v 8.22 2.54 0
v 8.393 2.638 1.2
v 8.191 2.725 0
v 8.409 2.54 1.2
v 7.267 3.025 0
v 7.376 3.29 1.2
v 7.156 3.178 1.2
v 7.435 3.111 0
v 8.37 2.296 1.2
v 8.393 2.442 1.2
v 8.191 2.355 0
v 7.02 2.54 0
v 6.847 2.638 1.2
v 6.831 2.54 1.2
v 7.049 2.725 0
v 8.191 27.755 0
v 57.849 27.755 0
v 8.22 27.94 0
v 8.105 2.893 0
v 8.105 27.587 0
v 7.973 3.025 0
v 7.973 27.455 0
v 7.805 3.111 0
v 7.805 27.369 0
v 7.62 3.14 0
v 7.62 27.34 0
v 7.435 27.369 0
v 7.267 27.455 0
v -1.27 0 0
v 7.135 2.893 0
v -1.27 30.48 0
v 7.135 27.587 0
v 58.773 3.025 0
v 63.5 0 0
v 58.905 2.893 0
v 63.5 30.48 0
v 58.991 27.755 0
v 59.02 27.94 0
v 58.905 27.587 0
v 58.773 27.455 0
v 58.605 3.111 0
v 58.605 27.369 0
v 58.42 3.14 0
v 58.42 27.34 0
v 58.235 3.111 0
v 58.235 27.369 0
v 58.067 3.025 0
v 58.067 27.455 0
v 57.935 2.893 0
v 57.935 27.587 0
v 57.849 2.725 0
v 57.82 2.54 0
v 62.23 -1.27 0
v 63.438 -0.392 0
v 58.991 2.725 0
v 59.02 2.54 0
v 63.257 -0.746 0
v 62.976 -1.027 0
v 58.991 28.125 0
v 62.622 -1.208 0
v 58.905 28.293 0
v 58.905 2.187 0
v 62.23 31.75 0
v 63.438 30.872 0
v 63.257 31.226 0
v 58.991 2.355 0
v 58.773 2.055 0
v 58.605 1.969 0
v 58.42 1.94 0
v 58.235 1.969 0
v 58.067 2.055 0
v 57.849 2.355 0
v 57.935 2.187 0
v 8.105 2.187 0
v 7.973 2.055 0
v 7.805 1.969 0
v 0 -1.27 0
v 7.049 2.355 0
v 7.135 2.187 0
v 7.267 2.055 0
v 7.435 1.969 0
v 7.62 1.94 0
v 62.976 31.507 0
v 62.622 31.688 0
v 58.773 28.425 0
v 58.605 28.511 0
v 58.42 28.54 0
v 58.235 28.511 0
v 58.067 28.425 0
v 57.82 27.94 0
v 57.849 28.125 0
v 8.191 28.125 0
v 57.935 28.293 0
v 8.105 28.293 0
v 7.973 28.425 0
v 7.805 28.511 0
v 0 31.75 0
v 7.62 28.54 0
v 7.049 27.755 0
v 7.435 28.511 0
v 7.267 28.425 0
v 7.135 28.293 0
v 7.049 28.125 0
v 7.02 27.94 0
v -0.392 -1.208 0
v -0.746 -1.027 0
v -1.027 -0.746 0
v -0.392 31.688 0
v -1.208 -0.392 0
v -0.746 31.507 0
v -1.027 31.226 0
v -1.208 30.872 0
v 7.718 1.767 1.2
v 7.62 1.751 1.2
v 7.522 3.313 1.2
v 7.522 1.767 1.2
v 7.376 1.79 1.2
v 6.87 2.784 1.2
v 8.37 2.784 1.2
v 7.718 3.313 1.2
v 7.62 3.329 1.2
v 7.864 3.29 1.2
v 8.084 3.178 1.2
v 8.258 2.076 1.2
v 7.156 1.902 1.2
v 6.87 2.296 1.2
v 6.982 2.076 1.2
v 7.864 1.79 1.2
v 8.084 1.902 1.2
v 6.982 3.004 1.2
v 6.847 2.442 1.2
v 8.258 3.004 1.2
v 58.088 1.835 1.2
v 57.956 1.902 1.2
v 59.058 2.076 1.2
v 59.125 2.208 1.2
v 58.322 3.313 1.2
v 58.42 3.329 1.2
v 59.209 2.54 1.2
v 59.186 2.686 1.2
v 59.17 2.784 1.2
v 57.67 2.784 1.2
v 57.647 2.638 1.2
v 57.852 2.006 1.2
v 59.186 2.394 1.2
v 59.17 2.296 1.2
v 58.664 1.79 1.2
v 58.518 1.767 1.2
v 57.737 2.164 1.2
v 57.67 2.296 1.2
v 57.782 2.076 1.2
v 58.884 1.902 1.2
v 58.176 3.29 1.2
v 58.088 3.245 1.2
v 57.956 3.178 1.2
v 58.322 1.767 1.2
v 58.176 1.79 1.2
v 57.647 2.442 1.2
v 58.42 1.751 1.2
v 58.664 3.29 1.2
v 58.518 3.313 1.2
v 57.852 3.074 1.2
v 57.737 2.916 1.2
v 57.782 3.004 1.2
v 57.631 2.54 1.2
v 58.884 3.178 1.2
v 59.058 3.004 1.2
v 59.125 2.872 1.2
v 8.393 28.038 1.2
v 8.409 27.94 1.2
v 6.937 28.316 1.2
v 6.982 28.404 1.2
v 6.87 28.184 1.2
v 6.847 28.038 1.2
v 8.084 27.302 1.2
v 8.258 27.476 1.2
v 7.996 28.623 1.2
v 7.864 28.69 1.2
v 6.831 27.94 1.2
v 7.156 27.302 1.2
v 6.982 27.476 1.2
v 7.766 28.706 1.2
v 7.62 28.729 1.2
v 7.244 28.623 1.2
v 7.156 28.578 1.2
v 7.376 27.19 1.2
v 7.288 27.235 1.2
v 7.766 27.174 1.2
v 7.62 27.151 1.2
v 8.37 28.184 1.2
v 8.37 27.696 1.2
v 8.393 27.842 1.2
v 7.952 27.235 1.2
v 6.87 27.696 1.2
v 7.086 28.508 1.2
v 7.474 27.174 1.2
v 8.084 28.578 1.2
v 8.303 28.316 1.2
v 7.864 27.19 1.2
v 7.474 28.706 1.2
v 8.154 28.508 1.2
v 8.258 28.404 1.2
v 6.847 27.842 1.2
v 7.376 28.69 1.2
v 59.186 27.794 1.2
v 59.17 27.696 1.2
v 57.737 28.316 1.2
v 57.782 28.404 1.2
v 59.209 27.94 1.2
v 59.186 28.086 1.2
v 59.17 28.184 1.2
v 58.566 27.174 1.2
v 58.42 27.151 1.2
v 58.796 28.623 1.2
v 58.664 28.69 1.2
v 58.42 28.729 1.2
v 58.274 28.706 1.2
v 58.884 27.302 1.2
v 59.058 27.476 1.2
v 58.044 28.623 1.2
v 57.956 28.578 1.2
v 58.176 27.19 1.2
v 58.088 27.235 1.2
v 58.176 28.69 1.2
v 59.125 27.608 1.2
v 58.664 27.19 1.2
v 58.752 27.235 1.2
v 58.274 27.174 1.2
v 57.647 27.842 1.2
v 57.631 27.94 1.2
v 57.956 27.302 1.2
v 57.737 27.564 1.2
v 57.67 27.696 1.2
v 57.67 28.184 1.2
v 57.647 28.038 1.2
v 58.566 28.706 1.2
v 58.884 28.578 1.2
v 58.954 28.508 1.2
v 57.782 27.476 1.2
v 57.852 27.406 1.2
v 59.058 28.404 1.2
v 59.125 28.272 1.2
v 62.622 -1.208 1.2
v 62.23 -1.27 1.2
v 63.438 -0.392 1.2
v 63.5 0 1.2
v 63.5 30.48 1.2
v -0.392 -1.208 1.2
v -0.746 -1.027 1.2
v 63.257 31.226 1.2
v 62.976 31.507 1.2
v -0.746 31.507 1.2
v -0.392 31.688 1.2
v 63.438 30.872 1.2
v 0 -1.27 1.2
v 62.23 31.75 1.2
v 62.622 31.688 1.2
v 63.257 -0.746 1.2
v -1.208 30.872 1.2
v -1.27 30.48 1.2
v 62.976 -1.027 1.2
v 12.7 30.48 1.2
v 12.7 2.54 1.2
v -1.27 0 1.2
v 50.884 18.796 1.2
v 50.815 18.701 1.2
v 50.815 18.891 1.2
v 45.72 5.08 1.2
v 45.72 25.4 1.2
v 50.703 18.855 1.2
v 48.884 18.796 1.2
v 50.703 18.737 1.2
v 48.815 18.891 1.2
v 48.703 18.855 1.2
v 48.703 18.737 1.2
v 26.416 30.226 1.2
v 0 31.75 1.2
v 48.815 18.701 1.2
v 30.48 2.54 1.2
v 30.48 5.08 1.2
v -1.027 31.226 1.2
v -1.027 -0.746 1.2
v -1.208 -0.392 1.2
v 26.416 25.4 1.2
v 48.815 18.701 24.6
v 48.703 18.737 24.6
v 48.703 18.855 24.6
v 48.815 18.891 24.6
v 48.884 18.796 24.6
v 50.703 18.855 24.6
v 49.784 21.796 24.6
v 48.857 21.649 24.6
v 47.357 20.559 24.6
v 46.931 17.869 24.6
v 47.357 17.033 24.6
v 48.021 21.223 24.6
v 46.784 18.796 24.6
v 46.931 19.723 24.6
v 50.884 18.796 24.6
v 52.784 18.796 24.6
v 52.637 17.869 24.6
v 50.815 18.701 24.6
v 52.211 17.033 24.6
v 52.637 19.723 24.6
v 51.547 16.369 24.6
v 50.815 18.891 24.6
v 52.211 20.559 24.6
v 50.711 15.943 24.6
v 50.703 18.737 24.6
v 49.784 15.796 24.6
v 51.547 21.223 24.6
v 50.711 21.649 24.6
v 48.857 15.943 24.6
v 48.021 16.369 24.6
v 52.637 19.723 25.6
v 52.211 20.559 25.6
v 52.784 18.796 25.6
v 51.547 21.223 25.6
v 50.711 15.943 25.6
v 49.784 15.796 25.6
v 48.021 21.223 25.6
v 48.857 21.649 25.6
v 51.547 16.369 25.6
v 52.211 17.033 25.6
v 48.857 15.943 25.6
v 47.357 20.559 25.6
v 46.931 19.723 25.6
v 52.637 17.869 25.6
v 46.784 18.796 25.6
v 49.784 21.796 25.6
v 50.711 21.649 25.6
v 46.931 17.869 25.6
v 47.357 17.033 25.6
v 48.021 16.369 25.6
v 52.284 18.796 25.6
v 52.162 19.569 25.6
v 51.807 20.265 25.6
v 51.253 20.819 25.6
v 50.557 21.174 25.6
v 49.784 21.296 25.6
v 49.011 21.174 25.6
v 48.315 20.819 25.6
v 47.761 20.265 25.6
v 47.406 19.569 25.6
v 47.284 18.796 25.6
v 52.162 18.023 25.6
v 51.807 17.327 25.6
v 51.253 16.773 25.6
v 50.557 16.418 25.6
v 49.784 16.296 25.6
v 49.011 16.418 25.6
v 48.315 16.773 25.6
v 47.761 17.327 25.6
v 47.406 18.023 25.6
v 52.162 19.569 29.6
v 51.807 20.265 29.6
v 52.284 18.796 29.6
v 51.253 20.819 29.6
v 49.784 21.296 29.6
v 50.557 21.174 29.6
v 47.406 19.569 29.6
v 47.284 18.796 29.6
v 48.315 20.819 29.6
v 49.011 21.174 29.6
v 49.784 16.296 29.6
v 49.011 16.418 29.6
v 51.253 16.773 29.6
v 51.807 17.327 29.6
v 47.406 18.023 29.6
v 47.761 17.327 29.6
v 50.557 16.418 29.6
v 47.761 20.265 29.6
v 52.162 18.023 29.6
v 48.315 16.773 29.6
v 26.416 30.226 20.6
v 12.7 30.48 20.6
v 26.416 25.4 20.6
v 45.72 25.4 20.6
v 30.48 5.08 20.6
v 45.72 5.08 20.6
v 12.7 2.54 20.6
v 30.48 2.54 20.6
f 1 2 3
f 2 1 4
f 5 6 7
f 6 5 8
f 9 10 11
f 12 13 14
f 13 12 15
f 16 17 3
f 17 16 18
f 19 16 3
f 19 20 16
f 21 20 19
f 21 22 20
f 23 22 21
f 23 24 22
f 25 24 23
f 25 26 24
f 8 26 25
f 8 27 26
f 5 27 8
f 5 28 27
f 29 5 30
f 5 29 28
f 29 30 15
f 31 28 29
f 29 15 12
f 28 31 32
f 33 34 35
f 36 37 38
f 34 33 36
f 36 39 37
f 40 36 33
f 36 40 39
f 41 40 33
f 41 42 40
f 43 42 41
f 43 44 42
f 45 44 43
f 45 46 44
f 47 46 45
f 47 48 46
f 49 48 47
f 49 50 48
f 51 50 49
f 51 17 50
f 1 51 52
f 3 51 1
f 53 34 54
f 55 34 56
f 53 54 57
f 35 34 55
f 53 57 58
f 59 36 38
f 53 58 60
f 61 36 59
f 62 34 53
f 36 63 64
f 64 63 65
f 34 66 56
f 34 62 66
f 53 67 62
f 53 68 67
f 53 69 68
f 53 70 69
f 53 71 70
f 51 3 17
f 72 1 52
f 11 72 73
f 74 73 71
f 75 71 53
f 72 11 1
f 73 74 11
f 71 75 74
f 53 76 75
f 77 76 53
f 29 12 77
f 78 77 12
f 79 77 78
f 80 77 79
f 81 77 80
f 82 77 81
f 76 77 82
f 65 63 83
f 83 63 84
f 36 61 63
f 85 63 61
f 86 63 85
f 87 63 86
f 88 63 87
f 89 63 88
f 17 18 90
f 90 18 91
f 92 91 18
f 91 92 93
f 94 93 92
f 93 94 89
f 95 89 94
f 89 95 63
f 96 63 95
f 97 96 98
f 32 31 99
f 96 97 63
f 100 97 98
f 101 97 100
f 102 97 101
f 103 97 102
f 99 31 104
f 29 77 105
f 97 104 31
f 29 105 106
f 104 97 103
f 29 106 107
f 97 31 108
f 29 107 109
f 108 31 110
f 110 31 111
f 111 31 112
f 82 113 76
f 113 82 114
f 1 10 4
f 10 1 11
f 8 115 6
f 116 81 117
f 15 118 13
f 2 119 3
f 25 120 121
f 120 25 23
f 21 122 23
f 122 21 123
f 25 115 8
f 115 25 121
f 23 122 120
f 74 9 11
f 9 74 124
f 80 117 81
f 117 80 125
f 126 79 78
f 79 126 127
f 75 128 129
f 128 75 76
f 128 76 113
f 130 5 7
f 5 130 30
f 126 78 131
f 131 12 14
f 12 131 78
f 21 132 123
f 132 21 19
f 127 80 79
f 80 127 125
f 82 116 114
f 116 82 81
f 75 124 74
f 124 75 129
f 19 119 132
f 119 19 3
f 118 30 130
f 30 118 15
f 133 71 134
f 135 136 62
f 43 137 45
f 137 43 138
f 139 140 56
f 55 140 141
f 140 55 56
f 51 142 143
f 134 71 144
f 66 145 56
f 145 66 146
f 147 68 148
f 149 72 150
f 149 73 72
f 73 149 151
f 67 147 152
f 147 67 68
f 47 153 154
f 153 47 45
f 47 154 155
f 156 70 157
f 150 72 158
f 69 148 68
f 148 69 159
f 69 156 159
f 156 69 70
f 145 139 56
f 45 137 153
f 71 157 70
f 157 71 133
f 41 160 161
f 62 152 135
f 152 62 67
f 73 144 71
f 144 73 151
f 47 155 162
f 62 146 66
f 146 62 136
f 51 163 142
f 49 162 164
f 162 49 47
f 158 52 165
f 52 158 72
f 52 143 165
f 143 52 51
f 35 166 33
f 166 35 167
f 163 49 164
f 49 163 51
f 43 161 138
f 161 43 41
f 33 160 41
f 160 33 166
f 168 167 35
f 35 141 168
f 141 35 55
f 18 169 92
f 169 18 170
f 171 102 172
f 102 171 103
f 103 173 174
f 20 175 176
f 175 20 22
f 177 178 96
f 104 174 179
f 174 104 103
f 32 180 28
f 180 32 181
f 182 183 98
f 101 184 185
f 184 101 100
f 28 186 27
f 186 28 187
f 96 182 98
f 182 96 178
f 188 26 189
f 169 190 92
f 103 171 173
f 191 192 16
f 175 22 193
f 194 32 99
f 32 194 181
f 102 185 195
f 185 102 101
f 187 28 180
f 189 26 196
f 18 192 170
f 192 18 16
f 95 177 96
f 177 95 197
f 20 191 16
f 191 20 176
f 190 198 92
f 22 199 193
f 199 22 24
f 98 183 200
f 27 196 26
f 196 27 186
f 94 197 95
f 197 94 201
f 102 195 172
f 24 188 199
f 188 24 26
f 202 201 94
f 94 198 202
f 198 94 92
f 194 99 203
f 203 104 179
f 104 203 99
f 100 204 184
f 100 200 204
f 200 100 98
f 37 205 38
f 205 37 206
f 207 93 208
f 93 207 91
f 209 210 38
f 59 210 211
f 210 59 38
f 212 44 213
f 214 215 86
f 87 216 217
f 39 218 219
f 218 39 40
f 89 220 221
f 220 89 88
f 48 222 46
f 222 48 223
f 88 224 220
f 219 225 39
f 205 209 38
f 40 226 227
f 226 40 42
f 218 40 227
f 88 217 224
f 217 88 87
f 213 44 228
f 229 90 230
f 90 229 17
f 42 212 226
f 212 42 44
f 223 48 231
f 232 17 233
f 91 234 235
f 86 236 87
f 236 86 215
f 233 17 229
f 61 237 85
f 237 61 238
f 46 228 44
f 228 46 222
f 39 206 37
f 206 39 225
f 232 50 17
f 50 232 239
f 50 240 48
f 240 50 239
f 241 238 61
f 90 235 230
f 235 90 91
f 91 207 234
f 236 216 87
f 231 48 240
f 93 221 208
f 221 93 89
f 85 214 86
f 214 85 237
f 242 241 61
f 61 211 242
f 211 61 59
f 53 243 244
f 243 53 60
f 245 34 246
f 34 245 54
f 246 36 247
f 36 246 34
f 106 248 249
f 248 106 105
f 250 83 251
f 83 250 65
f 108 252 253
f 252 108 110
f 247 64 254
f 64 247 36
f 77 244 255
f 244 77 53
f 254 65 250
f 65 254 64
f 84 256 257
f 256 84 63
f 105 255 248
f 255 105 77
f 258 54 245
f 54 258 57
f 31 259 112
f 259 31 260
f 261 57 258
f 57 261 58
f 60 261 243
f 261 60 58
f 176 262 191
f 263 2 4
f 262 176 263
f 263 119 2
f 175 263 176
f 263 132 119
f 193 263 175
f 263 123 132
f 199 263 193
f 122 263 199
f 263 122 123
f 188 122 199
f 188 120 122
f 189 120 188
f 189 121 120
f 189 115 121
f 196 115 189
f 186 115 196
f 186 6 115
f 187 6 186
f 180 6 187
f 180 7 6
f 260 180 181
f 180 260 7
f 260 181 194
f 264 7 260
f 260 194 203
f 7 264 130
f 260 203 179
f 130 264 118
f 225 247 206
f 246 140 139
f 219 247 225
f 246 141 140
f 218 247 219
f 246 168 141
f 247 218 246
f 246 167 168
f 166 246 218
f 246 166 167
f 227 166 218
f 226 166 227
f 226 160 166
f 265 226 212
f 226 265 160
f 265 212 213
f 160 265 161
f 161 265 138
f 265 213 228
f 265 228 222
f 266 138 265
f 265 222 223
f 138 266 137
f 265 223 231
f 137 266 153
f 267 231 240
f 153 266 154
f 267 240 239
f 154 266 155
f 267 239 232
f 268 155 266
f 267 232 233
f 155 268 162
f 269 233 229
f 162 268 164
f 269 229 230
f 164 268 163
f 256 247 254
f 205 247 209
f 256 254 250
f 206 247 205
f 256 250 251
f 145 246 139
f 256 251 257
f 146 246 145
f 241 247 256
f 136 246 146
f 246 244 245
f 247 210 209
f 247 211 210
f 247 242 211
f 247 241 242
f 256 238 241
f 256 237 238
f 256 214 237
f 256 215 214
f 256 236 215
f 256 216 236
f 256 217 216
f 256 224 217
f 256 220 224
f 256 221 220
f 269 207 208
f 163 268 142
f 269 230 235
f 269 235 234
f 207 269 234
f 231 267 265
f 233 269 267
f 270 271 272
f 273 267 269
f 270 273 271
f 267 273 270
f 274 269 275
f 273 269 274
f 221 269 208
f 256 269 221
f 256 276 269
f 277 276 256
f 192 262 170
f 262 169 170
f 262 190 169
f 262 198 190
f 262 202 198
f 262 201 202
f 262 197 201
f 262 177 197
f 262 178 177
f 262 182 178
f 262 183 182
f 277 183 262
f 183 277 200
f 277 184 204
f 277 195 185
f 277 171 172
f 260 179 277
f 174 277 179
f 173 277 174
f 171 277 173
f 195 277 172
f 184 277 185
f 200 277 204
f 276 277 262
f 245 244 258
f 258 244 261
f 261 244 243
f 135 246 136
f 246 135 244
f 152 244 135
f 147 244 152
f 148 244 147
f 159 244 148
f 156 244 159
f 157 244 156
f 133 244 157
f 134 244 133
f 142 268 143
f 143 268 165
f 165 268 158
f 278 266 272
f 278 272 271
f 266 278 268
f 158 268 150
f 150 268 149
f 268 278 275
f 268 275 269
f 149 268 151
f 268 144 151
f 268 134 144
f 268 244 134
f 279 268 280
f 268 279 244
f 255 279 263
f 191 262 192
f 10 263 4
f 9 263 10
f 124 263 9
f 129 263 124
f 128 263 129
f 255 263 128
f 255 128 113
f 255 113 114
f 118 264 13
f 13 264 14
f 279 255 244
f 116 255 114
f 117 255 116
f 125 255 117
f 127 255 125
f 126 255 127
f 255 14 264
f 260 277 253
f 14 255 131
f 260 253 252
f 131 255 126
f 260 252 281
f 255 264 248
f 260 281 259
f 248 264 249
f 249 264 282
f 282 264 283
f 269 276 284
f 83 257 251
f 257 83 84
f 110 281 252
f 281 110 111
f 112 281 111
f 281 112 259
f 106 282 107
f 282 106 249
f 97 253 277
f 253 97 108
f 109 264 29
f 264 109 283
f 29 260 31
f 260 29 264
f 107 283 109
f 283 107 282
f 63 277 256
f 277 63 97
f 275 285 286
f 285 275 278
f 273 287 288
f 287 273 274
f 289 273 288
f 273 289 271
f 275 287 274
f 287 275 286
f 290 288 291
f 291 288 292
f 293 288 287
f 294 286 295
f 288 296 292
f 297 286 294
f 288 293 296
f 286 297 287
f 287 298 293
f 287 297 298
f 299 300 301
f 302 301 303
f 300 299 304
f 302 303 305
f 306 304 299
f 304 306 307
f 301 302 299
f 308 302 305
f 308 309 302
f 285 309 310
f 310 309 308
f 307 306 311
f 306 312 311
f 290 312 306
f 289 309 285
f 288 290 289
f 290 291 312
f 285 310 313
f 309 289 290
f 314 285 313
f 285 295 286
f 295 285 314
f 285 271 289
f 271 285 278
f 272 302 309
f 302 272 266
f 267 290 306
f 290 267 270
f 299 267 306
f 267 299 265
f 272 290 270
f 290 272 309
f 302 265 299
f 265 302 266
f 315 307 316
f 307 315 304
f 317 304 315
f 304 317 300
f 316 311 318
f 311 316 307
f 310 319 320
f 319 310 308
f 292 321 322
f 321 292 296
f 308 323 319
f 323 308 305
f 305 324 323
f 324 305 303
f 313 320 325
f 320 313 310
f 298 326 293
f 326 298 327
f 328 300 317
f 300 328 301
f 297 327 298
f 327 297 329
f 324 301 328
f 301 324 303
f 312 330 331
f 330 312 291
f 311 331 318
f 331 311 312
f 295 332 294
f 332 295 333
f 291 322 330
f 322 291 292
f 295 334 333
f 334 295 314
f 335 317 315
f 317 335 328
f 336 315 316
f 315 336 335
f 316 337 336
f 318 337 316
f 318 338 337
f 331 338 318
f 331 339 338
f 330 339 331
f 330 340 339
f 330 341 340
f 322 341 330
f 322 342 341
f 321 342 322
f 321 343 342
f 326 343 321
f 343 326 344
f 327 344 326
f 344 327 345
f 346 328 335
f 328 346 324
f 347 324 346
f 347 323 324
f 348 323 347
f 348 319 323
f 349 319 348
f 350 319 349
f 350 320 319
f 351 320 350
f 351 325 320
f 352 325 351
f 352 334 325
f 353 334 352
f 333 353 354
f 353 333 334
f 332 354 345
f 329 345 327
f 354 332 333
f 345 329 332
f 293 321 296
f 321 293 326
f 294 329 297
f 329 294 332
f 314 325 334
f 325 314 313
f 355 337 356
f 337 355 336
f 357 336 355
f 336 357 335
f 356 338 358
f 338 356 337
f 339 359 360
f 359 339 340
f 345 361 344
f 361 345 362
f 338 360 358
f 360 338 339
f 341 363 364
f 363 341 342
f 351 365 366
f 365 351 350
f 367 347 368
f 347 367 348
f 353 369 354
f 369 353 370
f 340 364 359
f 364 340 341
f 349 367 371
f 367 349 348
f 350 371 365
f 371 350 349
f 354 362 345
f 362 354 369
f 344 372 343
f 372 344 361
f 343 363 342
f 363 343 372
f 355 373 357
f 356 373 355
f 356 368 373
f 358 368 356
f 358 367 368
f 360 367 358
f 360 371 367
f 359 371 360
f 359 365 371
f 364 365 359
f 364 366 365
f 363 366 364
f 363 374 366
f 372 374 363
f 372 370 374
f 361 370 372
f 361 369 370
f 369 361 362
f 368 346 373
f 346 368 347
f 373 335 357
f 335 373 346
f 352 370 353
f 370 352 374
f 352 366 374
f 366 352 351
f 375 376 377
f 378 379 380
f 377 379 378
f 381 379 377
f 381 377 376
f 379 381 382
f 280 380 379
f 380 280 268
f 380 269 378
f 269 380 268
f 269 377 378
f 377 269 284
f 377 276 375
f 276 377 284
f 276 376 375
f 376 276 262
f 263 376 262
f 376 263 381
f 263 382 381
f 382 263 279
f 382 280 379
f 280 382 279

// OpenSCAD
h = 0.6;
i = 25.4;

fn = 20;

w = 2.45 * i;
d = 1.2 * i;


difference()
{
    minkowski()
    {
        cube([w, d, h]);
        cylinder(d = 0.1 * i, h, $fn = fn);
    }
    
    translate([0.3 * i, 0.1 * i, 0])
        quads(2 * i, 1 * i)
            cylinder(0.1 * i, h, $fn = fn);
}

translate ([1.96 * i,0.74 * i,h + 24])
{
    translate([-1,0,-24]) cylinder(d = 0.2, 24);
    translate([1,0,-24]) cylinder(d = 0.2, 24);
    cylinder(d = 6, 1, $fn = fn);
    cylinder(d = 5, 5, $fn = fn);
}

translate([0.5 *i,0.1 * i,h])
{
    scale([i,i,1])
    linear_extrude(20)
    {
        polygon([[0,0], [0,1.1], [0.54,1.09], [0.54, 0.9], [1.3,0.9], [1.3,0.1], [0.7, 0.1], [0.7,0], [0,0]]);
    }
}

module quads(x, y)
{
    translate([0,0]) children();
    translate([x,0]) children();
    translate([0,y]) children();
    translate([x,y]) children();
}
